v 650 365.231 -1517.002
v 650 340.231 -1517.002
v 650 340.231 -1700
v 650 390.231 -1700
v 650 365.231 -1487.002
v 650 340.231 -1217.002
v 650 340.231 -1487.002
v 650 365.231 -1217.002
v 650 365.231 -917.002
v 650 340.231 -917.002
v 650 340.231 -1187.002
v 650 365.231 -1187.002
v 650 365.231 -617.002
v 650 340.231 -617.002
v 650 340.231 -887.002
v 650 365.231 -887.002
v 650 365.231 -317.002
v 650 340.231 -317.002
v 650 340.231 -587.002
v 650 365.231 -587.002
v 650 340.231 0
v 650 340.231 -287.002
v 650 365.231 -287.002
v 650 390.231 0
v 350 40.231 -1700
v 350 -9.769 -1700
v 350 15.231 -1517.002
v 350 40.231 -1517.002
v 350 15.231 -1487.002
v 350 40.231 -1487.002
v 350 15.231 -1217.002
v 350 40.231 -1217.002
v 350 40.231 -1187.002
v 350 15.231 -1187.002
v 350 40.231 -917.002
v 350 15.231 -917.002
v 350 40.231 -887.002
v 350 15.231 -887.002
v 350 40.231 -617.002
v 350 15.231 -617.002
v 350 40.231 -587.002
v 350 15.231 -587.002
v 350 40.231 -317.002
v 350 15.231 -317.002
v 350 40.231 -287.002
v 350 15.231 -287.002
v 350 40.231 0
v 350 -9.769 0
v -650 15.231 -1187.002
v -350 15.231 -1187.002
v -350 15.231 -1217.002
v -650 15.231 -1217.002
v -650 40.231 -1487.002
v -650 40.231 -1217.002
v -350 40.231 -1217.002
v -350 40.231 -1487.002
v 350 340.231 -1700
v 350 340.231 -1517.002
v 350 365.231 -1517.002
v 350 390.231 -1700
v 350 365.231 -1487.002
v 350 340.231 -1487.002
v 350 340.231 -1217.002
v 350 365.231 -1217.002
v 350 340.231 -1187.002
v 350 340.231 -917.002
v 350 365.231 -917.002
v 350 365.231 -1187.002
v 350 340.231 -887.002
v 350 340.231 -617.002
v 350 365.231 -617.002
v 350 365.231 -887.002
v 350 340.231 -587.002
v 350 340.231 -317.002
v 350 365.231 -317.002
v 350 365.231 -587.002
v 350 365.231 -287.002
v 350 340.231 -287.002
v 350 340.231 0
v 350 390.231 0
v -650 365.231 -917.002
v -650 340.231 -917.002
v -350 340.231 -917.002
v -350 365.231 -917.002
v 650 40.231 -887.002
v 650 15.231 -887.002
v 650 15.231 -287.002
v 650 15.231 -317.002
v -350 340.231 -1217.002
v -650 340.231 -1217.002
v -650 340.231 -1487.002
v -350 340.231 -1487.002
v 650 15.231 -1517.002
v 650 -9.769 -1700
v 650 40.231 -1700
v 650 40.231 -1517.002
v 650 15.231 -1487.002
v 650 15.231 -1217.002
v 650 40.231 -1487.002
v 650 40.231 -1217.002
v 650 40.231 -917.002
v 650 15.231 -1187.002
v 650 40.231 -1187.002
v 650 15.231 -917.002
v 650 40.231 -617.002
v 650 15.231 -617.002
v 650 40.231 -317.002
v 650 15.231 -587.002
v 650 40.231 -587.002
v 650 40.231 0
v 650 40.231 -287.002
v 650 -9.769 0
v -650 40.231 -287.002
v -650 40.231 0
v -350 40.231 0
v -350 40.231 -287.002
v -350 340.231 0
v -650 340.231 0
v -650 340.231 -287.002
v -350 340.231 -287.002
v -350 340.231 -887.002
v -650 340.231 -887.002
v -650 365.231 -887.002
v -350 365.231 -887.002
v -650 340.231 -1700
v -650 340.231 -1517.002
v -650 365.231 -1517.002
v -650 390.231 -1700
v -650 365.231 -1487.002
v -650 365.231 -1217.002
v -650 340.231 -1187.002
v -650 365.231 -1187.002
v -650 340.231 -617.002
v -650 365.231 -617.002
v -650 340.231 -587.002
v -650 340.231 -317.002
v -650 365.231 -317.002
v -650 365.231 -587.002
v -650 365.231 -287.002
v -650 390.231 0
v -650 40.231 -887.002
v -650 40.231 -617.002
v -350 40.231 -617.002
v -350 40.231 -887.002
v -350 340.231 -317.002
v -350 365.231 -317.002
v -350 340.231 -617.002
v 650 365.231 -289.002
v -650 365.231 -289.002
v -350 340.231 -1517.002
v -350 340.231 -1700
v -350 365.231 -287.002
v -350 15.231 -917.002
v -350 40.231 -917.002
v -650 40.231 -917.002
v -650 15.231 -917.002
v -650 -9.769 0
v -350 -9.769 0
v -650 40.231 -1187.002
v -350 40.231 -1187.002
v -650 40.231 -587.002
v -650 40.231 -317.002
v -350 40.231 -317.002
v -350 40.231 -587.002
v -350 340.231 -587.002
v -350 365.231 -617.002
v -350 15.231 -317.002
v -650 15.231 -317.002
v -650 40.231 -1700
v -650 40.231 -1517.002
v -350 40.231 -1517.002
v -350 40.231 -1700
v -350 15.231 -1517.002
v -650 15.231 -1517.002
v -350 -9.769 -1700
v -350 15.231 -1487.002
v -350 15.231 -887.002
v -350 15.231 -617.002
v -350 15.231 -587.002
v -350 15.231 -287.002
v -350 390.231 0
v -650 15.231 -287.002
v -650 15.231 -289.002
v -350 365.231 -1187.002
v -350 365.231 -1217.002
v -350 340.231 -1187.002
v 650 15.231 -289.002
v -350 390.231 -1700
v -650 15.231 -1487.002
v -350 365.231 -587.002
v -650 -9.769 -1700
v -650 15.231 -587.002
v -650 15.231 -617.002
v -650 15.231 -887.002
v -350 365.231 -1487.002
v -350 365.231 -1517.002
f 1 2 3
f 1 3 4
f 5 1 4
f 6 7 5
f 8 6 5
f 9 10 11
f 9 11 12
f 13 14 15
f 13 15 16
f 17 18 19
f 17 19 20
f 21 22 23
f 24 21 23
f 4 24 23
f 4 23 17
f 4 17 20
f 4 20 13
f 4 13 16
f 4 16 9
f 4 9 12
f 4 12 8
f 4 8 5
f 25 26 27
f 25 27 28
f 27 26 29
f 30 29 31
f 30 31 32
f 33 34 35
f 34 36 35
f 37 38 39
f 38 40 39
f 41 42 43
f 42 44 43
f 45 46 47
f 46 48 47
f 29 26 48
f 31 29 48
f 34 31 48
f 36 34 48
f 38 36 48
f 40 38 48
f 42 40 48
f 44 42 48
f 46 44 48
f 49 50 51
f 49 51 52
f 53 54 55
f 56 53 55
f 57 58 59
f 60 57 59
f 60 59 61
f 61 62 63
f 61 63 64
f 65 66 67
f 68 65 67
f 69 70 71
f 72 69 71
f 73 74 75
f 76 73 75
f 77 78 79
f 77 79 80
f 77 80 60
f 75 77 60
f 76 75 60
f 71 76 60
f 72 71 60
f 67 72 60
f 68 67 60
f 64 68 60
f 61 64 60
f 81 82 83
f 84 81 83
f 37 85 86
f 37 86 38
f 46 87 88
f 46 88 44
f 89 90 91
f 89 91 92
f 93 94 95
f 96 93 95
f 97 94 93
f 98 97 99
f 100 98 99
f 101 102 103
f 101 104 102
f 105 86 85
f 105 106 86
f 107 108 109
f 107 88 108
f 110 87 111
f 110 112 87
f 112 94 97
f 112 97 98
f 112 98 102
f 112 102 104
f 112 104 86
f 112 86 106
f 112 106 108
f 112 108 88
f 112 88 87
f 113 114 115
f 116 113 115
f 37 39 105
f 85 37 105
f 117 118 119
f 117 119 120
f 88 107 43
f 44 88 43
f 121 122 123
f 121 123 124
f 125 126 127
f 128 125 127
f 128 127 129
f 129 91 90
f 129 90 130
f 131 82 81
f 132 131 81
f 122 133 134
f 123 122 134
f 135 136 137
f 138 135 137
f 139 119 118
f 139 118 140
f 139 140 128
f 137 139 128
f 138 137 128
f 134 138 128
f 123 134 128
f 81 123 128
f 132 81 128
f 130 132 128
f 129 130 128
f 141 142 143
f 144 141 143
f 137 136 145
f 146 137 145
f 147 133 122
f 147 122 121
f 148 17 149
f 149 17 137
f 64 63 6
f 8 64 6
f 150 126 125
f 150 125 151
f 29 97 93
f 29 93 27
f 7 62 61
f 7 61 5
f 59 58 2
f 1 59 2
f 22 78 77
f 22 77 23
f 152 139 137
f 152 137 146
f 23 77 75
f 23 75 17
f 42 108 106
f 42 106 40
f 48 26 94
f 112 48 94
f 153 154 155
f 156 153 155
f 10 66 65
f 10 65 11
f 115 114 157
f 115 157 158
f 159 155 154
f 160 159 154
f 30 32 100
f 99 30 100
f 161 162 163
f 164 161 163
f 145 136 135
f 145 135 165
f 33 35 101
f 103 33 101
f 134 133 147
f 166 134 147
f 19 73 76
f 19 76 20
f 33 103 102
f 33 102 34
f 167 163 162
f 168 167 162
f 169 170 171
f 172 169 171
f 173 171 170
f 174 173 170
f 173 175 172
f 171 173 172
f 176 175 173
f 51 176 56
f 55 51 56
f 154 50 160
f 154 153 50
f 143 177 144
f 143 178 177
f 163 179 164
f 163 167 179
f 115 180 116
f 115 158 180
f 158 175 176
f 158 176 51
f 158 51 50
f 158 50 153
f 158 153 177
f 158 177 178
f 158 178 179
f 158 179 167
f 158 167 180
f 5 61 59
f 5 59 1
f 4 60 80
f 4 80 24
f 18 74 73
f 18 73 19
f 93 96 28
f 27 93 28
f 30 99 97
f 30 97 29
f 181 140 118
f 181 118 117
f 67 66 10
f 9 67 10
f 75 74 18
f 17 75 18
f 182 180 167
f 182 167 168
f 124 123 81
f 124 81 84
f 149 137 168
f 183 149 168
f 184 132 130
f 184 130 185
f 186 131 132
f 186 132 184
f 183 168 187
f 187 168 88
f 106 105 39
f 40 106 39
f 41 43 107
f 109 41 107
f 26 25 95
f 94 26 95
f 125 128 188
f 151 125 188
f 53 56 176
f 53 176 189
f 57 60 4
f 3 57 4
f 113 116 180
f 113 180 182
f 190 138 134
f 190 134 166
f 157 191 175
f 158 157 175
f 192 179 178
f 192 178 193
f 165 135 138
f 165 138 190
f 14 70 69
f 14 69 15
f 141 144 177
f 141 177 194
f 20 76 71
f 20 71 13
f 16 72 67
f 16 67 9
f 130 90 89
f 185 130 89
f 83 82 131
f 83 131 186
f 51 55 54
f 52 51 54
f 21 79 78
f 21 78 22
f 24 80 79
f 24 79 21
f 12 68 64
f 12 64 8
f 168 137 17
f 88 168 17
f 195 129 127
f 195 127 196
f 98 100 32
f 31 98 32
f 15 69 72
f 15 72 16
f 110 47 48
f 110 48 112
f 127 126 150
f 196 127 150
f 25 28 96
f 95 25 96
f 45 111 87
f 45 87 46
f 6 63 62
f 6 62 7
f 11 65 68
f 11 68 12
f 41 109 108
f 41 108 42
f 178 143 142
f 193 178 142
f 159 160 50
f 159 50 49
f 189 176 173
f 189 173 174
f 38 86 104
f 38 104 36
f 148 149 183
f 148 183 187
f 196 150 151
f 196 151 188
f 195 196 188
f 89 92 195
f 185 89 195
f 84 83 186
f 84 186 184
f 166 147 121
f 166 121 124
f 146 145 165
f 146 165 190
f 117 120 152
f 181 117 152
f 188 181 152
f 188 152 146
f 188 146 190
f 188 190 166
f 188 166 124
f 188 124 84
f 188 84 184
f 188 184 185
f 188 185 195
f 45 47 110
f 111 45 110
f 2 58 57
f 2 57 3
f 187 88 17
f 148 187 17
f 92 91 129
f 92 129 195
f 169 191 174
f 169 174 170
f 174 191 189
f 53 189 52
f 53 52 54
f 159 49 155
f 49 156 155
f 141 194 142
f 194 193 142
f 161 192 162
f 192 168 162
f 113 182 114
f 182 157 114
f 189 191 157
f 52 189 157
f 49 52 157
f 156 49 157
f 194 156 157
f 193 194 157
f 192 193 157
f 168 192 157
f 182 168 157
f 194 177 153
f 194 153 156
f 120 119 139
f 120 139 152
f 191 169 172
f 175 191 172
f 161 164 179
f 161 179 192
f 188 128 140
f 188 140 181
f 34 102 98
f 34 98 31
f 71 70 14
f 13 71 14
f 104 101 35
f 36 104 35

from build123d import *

# Parameters (mm, degrees)
F0_W     = 300
F0_H     = 50
F1_DEPTH = 1700
F2_W     = 300
F2_H     = 30
F3_DEPTH = 25
F4_W     = 300
F4_H     = 30
F6_DEPTH = 25
F7_DEPTH = 28


with BuildPart() as f1:
    # F0 (on Top) → F1 (new body)
    with BuildSketch(Plane.XY):
        with Locations((-500, 15.231046)):
            Rectangle(F0_W, F0_H)
        with Locations((500, 15.231046)):
            Rectangle(F0_W, F0_H)
        with Locations((-500, 365.231046)):
            Rectangle(F0_W, F0_H)
        with Locations((500, 365.231046)):
            Rectangle(F0_W, F0_H)
    extrude(amount=-F1_DEPTH)

    # F2 (on face) → F3 (cut)
    with BuildSketch(Plane.XZ.offset(-340.231046)):
        with Locations((500, -1502.00151)):
            Rectangle(F2_W, F2_H)
        with Locations((500, -1202.00151)):
            Rectangle(F2_W, F2_H)
        with Locations((500, -902.00151)):
            Rectangle(F2_W, F2_H)
        with Locations((500, -602.00151)):
            Rectangle(F2_W, F2_H)
        with Locations((500, -302.00151)):
            Rectangle(F2_W, F2_H)
        with Locations((-500, -1502.00151)):
            Rectangle(F2_W, F2_H)
        with Locations((-500, -1202.00151)):
            Rectangle(F2_W, F2_H)
        with Locations((-500, -602.00151)):
            Rectangle(F2_W, F2_H)
        with Locations((-500, -302.00151)):
            Rectangle(F2_W, F2_H)
        with Locations((-500, -902.00151)):
            Rectangle(F2_W, F2_H)
    extrude(amount=-F3_DEPTH, mode=Mode.SUBTRACT)

    # F4 (on face) → F6 (cut)
    with BuildSketch(Plane(origin=(0, 40.231046, 0), x_dir=(-1, 0, 0), z_dir=(0, 1, 0))):
        with Locations((500, -1502.00151)):
            Rectangle(F4_W, F4_H)
        with Locations((500, -1202.00151)):
            Rectangle(F4_W, F4_H)
        with Locations((500, -902.00151)):
            Rectangle(F4_W, F4_H)
        with Locations((500, -602.00151)):
            Rectangle(F4_W, F4_H)
        with Locations((500, -302.00151)):
            Rectangle(F4_W, F4_H)
        with Locations((-500, -1502.00151)):
            Rectangle(F4_W, F4_H)
        with Locations((-500, -1202.00151)):
            Rectangle(F4_W, F4_H)
        with Locations((-500, -302.00151)):
            Rectangle(F4_W, F4_H)
        with Locations((-500, -602.00151)):
            Rectangle(F4_W, F4_H)
        with Locations((-500, -902.00151)):
            Rectangle(F4_W, F4_H)
    extrude(amount=-F6_DEPTH, mode=Mode.SUBTRACT)


with BuildPart() as f7:
    # F5 (on face) → F7 (new body)
    with BuildSketch(Plane.XY.offset(-317.00151)):
        Polygon((650, 15.231046), (650, 340.231046), (650, 365.231046), (-650, 365.231046), (-650, 15.231046), align=None)
    extrude(amount=F7_DEPTH)


solid = Compound([f1.part, f7.part])
